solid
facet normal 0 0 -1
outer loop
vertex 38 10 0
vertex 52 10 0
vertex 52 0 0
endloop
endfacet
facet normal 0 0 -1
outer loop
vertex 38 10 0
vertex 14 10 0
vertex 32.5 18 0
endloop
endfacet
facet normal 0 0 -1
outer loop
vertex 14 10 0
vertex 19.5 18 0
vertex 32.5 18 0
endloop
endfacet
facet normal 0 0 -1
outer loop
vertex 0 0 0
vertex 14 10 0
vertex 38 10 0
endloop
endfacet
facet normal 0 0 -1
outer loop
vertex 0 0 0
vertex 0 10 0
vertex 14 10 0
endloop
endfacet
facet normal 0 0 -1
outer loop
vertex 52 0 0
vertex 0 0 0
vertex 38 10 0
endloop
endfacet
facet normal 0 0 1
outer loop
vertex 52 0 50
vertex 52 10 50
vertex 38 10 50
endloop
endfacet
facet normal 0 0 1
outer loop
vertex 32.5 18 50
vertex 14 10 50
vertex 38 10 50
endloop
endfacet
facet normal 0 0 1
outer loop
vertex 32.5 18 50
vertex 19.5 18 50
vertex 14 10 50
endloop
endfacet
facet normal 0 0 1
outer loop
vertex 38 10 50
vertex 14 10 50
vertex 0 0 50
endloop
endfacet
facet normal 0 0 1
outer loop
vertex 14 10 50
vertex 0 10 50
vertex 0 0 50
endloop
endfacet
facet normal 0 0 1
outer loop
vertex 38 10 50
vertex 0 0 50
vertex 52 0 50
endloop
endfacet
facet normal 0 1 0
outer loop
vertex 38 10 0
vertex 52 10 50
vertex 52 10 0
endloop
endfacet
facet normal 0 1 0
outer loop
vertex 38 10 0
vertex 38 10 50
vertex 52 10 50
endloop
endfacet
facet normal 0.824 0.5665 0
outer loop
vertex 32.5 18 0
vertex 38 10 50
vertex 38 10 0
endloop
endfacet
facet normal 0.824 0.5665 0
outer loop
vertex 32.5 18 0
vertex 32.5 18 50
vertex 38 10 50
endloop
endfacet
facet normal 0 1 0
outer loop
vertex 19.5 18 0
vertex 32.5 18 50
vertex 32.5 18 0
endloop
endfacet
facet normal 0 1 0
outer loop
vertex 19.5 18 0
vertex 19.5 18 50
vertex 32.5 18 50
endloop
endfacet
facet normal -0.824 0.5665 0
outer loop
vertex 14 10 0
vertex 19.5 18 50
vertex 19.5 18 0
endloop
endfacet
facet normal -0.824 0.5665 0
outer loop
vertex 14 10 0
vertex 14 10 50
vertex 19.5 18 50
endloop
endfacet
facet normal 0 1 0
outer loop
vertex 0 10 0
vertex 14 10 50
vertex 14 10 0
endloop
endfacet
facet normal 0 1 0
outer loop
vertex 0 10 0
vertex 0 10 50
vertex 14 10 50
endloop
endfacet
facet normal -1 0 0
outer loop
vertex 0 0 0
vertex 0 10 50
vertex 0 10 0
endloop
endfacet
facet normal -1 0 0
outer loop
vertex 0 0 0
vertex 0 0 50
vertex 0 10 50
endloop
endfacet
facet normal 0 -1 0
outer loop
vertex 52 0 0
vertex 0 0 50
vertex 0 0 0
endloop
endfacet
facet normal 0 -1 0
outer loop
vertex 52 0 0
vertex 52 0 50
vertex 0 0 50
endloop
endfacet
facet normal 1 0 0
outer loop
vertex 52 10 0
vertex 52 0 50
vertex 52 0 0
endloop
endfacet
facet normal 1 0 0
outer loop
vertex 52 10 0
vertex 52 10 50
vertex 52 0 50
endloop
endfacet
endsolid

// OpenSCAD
$fn = 32;

// ----------------------------------------------------------------------
// V guide rail: dovetail, 52 mm wide
// ----------------------------------------------------------------------

// --- parameters (mm) ---
rail_w = 52;              // rail width, X
base_t = 10;              // base plate thickness
v_depth = 8;              // V feature depth / height
v_half_w = 12;            // half width of the V at the base face
plate_t = 50;             // rail length, Z (the extrusion height)
top_half_w = 6.5;         // half width at the dovetail top
fit_tol = 0.02;           // declared fit tolerance (prompt contract)
free_tol = 0.2;           // declared free tolerance (prompt contract)

dovetail_base = 2 * v_half_w;  // dovetail width at the base
dovetail_top = 2 * top_half_w;  // dovetail width at the top

profile = [[0, 0], [52, 0], [52, 10], [38, 10], [32.5, 18], [19.5, 18], [14, 10], [0, 10]];  // primary outline, 8 points, counter clockwise

// --- the one profile operation ---
linear_extrude(height = plate_t) polygon(points = profile);
